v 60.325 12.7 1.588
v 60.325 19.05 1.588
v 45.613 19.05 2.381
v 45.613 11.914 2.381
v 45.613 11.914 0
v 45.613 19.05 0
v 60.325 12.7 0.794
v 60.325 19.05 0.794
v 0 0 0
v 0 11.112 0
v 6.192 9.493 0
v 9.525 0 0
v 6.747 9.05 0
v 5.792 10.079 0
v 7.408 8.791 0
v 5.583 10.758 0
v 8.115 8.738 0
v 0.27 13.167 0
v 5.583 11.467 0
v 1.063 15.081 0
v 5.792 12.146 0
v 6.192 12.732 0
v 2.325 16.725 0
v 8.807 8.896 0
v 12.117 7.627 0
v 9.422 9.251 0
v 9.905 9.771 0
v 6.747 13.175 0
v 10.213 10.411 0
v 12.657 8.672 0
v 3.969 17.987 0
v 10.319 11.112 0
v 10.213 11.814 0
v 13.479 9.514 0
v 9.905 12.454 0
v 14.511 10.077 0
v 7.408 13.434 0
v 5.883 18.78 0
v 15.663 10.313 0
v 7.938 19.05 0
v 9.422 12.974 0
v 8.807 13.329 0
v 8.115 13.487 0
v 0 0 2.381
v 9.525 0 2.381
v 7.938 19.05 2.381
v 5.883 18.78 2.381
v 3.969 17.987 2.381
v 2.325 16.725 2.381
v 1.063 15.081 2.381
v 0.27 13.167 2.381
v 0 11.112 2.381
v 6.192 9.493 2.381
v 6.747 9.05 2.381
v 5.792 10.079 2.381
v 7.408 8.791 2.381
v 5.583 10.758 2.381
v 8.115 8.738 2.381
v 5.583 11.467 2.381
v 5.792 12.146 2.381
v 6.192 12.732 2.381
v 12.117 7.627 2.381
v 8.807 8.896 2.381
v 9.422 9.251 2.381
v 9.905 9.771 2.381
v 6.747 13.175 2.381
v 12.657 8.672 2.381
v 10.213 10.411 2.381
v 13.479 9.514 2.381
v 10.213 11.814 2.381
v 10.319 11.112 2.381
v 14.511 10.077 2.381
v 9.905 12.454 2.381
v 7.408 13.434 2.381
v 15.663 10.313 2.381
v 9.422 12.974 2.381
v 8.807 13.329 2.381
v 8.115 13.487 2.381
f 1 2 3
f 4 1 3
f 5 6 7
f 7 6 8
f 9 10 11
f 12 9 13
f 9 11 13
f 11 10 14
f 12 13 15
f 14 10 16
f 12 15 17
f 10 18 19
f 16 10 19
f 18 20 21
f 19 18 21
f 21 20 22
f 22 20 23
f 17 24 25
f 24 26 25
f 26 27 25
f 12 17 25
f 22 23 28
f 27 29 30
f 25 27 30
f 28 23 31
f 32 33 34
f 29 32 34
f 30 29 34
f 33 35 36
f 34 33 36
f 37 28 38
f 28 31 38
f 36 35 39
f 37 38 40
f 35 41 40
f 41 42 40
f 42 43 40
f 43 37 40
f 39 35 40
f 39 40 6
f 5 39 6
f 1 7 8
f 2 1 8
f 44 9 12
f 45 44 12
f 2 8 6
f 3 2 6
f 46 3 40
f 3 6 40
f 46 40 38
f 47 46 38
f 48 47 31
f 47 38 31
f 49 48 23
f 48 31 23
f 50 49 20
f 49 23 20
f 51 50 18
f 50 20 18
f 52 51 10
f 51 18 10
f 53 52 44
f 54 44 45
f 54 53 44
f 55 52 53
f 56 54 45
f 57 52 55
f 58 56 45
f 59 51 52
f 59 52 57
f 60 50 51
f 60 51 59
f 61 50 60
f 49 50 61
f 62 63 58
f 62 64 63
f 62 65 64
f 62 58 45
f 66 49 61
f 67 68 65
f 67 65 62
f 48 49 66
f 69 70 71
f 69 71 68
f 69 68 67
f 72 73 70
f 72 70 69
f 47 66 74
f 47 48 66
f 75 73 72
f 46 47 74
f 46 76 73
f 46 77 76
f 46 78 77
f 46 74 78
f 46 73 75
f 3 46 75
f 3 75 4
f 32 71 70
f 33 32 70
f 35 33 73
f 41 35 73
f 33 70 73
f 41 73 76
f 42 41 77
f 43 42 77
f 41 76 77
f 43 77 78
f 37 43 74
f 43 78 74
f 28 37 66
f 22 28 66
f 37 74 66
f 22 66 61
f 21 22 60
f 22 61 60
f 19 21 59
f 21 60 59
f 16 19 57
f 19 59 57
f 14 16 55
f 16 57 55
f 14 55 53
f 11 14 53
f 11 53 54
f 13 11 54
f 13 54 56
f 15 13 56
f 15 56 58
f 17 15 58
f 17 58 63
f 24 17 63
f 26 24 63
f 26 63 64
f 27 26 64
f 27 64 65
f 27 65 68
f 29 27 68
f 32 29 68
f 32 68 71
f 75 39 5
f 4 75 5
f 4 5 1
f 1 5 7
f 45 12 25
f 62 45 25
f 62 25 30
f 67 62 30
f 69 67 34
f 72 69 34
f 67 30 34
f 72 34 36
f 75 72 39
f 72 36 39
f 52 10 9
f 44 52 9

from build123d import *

# Parameters (mm, degrees)
F1_DEPTH = 2.38125
F2_R     = 2.38125
F3_DEPTH = 2.38225
F5_DEPTH = 25.4


with BuildPart() as f1:
    # F0 (on Top) → F1 (new body)
    with BuildSketch(Plane.XY):
        with BuildLine():
            Line((60.325, 19.05), (7.9375, 19.05))
            ThreePointArc((7.9375, 19.05), (2.32484, 16.72516), (0, 11.1125))
            Line((0, 11.1125), (0, 0))
            Line((0, 0), (9.525, 0))
            Line((9.525, 0), (12.117365, 7.627166))
            ThreePointArc((12.117365, 7.627166), (13.478615, 9.513592), (15.663196, 10.313094))
            Line((15.663196, 10.313094), (60.325, 12.7))
            Line((60.325, 12.7), (60.325, 19.05))
        make_face()
    extrude(amount=F1_DEPTH)

    # F2 (on face) → F3 (cut, through all)
    with BuildSketch(Plane.XY.offset(2.38125)):
        with Locations((7.9375, 11.1125)):
            Circle(F2_R)
    extrude(amount=-F3_DEPTH, mode=Mode.SUBTRACT)

    # F4 (on face) → F5 (cut)
    with BuildSketch(Plane(origin=(0, 19.05, 0), x_dir=(-1, 0, 0), z_dir=(0, 1, 0))):
        Polygon((-45.61263, 0), (-60.325, 0.79375), (-60.325, 0), align=None)
        Polygon((-45.61263, 2.38125), (-60.325, 2.38125), (-60.325, 1.5875), align=None)
    extrude(amount=-F5_DEPTH, mode=Mode.SUBTRACT)


solid = f1.part
